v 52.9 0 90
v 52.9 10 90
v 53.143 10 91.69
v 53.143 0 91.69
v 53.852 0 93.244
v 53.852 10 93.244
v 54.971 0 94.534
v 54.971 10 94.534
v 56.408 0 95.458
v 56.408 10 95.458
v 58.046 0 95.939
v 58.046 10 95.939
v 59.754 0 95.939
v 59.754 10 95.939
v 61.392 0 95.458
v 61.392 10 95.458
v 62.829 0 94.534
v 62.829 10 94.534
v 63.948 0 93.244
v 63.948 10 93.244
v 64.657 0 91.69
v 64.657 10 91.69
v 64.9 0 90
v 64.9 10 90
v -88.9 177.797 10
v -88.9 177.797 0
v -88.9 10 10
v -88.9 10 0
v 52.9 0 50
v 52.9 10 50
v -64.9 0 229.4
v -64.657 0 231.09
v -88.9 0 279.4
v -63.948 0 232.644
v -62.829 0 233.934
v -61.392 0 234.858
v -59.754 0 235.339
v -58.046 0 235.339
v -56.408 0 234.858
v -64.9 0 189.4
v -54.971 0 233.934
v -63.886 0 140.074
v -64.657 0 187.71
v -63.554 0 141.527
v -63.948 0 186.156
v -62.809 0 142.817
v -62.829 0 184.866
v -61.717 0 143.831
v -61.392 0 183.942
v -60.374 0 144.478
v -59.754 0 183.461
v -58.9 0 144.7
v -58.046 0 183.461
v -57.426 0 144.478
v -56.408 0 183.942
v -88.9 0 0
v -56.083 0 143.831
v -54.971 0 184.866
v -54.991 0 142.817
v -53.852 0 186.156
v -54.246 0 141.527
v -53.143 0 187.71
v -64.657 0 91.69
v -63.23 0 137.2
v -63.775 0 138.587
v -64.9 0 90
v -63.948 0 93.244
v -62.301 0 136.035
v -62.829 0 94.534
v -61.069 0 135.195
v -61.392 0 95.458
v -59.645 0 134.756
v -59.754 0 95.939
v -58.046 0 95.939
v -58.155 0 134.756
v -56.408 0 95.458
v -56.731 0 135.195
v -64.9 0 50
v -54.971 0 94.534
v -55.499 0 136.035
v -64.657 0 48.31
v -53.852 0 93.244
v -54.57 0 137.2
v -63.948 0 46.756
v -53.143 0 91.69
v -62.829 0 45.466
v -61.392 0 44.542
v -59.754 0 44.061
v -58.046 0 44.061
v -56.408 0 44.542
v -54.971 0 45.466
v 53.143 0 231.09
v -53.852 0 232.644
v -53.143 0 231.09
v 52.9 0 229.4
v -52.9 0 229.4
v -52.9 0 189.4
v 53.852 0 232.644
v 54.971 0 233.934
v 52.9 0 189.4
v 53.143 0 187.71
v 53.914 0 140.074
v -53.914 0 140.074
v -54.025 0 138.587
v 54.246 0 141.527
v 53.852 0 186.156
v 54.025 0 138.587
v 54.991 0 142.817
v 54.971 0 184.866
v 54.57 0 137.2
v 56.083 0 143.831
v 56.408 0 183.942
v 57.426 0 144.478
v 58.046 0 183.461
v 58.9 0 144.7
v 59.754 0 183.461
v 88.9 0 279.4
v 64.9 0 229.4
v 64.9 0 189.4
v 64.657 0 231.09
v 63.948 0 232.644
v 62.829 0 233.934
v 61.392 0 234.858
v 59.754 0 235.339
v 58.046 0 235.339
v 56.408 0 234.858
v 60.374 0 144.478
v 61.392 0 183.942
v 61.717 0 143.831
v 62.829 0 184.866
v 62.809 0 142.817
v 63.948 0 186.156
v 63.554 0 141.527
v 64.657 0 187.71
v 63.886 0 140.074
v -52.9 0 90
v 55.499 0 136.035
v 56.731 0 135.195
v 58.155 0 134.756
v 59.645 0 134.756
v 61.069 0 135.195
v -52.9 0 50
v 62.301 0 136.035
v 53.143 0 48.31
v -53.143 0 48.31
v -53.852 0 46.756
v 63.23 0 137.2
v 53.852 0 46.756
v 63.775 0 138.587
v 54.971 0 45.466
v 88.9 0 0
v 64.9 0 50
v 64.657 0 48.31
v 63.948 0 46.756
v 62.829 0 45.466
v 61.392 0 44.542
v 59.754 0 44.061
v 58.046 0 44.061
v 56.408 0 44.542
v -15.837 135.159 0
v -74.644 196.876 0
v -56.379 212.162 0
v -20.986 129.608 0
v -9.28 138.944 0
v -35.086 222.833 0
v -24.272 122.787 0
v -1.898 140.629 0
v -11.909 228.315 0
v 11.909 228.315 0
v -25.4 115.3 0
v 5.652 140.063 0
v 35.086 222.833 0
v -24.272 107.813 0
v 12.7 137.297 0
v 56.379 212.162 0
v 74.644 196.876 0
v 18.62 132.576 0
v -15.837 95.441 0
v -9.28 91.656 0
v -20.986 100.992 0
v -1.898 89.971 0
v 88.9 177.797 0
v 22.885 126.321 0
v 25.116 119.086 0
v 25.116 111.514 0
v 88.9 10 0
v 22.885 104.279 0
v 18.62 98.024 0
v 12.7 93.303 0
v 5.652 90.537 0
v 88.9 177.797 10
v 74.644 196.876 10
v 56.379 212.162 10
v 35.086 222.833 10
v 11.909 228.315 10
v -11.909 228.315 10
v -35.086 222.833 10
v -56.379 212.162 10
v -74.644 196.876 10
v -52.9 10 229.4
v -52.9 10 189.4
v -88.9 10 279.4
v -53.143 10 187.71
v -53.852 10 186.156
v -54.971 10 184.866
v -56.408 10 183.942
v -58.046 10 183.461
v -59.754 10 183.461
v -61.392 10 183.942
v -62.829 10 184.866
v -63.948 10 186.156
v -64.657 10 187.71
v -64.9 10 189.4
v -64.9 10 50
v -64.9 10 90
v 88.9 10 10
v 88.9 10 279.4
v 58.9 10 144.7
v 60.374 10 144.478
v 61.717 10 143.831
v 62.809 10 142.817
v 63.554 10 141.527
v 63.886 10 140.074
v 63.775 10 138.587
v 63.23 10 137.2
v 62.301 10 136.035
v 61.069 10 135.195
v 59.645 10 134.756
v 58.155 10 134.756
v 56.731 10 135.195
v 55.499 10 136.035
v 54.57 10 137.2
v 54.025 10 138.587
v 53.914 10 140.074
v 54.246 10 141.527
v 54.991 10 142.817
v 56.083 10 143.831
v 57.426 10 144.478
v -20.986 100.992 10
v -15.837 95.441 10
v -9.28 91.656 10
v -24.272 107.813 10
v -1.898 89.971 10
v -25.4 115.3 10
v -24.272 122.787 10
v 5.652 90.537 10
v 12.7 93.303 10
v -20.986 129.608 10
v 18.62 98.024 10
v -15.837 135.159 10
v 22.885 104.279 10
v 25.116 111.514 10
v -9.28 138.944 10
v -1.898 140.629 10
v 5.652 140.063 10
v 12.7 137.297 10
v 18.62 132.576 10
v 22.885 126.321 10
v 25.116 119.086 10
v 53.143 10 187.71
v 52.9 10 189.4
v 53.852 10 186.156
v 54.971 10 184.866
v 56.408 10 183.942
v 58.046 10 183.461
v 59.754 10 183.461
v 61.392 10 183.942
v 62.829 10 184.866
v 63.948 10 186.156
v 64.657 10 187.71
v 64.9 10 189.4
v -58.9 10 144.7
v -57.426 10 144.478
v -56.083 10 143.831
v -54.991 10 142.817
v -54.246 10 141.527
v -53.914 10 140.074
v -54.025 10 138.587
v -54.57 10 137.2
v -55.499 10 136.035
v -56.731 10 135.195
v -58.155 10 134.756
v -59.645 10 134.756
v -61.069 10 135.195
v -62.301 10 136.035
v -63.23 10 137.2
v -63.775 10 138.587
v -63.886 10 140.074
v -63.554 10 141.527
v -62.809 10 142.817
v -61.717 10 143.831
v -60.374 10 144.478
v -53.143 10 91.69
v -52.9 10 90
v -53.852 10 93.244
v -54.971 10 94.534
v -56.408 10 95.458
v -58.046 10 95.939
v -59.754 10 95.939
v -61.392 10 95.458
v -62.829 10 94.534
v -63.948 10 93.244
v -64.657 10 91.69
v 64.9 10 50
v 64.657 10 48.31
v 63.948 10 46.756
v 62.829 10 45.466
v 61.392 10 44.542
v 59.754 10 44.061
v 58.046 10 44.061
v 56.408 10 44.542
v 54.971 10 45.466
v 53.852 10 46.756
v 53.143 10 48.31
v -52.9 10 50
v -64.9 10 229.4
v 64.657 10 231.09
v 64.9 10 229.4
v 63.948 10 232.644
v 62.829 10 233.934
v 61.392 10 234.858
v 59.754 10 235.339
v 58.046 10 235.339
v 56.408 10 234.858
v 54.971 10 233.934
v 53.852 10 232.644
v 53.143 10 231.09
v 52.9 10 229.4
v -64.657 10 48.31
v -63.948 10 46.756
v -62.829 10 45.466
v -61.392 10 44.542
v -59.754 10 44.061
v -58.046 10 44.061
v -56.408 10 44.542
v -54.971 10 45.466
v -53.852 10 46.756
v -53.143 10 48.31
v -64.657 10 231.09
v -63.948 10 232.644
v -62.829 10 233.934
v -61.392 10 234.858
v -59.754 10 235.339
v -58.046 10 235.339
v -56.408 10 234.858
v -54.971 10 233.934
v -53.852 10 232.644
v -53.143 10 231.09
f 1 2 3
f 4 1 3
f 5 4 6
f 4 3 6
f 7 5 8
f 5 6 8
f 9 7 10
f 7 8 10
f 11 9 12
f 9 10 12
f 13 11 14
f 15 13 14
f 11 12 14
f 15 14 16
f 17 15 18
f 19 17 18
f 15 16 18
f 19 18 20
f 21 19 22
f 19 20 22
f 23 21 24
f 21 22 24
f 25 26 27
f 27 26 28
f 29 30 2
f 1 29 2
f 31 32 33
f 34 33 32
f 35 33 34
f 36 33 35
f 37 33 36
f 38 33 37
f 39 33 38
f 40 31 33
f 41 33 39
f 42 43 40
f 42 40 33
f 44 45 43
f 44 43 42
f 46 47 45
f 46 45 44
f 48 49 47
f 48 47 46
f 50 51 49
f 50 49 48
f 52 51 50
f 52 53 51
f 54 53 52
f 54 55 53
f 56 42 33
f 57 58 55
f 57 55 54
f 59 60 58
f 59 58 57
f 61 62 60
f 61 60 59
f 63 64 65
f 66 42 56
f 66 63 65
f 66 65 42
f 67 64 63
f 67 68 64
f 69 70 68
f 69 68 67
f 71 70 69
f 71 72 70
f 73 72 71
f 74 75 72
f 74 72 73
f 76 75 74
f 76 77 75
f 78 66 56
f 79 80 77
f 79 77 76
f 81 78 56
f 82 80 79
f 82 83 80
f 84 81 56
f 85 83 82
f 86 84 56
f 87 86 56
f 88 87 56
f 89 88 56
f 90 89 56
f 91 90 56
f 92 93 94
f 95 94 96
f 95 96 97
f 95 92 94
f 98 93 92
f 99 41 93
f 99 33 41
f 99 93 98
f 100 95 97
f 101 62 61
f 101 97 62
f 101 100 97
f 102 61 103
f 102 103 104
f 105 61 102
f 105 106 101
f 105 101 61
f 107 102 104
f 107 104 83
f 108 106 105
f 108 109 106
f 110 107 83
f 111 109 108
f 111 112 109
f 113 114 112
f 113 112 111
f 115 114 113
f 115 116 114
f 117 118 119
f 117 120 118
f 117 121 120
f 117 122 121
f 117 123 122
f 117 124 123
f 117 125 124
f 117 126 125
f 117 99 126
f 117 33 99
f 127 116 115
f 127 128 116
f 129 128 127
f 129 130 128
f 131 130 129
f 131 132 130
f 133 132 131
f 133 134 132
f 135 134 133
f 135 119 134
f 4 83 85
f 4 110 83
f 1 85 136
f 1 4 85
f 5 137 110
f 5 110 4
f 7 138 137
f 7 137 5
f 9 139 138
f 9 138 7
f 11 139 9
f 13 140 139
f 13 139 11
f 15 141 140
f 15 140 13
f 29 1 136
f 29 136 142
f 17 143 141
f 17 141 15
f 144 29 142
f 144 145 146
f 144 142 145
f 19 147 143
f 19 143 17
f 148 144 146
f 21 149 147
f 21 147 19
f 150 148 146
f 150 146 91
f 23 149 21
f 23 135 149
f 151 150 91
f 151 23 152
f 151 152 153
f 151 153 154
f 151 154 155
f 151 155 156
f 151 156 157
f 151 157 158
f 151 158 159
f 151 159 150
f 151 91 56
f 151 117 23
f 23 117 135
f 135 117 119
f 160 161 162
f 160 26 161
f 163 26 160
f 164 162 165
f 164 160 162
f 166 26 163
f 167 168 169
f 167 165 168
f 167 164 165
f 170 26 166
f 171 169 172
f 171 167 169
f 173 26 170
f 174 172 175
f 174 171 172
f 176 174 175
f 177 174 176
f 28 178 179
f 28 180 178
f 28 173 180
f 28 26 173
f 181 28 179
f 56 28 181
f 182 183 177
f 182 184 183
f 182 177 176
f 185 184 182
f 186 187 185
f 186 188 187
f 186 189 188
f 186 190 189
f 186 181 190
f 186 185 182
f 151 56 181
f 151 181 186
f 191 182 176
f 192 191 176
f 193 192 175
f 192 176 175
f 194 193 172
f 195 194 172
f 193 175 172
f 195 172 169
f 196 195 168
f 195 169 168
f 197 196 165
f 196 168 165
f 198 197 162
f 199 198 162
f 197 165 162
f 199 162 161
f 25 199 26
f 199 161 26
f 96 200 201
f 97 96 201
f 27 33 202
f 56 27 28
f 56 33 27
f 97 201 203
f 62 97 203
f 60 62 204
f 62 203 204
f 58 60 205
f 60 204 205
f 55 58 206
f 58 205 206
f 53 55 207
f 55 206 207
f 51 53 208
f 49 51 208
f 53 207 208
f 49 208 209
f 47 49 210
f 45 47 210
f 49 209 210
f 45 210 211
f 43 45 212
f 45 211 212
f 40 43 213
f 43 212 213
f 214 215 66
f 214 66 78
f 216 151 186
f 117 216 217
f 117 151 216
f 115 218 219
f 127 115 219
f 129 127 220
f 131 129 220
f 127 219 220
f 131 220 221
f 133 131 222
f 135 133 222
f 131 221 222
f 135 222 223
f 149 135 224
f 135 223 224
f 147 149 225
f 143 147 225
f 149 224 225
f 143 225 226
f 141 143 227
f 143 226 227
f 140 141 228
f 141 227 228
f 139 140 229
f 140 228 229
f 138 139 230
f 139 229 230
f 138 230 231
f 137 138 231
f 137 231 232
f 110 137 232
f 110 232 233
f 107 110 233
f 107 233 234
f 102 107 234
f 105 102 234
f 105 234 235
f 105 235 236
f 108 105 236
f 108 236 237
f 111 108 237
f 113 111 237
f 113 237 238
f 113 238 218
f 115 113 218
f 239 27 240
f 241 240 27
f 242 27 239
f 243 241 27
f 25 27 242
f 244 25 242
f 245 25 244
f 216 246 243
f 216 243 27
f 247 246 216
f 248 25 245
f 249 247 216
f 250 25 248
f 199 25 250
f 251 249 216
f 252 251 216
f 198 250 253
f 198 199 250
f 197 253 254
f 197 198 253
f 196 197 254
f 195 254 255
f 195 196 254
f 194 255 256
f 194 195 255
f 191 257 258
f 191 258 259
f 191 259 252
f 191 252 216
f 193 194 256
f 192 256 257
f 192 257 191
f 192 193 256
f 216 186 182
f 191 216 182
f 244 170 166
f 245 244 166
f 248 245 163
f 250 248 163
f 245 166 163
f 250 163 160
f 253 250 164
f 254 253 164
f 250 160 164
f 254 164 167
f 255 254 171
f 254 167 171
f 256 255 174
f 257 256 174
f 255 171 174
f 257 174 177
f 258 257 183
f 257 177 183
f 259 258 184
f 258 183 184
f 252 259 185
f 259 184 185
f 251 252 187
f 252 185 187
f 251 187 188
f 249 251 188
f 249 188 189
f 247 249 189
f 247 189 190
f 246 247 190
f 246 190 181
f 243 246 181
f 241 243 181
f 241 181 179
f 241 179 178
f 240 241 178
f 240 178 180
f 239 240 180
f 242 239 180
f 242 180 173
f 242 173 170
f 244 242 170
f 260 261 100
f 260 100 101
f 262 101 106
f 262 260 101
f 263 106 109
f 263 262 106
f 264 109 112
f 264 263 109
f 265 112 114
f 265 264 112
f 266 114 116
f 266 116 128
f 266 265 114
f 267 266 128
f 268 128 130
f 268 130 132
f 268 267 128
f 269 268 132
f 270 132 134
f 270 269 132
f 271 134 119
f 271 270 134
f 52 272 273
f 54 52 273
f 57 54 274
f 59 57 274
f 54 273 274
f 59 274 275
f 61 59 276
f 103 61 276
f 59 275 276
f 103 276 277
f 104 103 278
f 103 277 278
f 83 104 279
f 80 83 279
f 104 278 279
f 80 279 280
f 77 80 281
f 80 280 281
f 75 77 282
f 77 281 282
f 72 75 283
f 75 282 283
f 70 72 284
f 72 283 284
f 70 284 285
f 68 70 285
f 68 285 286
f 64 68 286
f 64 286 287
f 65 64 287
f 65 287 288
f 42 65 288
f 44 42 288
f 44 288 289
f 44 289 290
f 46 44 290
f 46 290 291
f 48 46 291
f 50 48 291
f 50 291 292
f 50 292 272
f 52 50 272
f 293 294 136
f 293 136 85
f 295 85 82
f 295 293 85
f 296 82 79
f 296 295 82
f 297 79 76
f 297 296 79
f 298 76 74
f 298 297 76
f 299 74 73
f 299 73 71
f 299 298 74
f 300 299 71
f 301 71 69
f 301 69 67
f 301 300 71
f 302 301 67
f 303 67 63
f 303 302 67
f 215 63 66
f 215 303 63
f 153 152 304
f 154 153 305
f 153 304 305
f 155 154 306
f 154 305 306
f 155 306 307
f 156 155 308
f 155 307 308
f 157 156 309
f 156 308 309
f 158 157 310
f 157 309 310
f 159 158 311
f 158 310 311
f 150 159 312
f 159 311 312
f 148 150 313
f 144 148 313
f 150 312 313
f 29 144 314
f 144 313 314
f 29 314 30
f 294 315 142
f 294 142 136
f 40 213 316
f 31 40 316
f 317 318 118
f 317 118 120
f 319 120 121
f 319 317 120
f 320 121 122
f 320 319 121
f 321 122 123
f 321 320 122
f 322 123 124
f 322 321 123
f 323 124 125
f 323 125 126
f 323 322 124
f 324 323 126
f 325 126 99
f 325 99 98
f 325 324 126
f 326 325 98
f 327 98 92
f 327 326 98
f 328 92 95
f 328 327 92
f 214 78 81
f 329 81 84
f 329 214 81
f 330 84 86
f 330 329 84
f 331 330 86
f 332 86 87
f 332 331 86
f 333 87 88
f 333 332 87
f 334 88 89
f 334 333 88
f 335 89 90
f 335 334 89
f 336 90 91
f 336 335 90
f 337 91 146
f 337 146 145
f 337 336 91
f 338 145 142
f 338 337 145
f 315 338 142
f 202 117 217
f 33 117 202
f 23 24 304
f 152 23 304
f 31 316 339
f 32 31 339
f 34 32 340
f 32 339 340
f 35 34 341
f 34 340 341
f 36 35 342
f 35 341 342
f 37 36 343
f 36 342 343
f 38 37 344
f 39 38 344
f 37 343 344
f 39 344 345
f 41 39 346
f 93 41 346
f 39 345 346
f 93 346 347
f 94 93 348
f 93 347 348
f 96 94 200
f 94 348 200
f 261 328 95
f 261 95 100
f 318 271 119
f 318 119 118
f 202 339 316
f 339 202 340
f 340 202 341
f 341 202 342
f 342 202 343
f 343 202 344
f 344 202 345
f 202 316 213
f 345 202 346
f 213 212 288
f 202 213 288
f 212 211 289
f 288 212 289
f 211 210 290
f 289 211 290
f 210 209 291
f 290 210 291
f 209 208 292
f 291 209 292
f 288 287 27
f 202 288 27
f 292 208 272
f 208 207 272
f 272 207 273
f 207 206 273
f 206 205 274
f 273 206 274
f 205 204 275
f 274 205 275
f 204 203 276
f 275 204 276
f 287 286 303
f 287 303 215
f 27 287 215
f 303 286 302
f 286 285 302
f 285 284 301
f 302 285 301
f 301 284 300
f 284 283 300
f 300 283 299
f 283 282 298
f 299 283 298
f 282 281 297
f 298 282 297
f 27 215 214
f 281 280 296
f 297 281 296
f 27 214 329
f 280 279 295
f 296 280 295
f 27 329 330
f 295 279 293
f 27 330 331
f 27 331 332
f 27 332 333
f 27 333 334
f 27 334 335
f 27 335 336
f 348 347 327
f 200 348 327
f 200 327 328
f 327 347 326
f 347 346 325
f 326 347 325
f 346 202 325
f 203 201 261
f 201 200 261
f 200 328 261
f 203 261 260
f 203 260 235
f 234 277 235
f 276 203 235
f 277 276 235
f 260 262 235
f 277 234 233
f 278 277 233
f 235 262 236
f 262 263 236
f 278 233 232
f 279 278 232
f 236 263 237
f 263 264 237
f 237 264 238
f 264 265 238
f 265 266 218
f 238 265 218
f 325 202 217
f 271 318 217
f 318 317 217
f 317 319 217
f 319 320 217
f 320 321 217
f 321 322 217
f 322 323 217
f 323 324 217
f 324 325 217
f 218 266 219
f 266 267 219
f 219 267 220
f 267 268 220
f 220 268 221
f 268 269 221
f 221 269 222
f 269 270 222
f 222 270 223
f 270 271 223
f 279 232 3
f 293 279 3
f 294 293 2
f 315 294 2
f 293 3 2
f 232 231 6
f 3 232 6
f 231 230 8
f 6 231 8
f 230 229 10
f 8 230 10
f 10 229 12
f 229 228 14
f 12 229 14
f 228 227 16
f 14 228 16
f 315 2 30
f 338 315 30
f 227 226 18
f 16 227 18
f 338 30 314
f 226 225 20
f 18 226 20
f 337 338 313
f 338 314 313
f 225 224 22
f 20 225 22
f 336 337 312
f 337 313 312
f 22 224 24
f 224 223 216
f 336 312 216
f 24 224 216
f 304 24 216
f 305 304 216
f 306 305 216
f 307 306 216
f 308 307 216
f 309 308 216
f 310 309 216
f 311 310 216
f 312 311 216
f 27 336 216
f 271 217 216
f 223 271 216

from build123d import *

# Parameters (mm, degrees)
BOSS_EXTRUDE2_DEPTH = 10
BOSS_EXTRUDE3_DEPTH = 10
SKETCH2_R           = 25.4
CUT_EXTRUDE2_DEPTH  = 373.037550256
CUT_EXTRUDE5_DEPTH  = 10
SKETCH4_R           = 5
CUT_EXTRUDE6_DEPTH  = 366.966927049


with BuildPart() as part:
    # 3DSketch1 → Boss-Extrude2 (new body)
    with BuildSketch(Plane(origin=(88.9, 0, 0), x_dir=(-0.5368754921931593, 0, 0.8436614877321076), z_dir=(0, 1, 0))):
        Polygon((0, 0), (235.719019672, 150.003012519), (331.175482184, 0), (95.456462512, -150.003012519), align=None)
    extrude(amount=BOSS_EXTRUDE2_DEPTH)

    # Sketch1 → Boss-Extrude3 (add)
    with BuildSketch(Plane.XY):
        with BuildLine():
            Line((-88.9, 0), (88.9, 0))
            Line((88.9, 0), (88.9, 177.796999188))
            ThreePointArc((88.9, 177.796999188), (0, 229.007355341), (-88.9, 177.796999188))
            Line((-88.9, 177.796999188), (-88.9, 0))
        make_face()
    extrude(amount=BOSS_EXTRUDE3_DEPTH)

    # Sketch2 → Cut-Extrude2 (cut, through all)
    with BuildSketch(Plane(origin=(0, 0, 0), x_dir=(-1, 0, 0), z_dir=(0, 0, -1))):
        with Locations((0, 115.3)):
            Circle(SKETCH2_R)
    extrude(amount=-CUT_EXTRUDE2_DEPTH, mode=Mode.SUBTRACT)

    # Sketch3 → Cut-Extrude5 (cut)
    with BuildSketch(Plane(origin=(0, 10, 0), x_dir=(1, 0, 0), z_dir=(0, 1, 0))):
        with BuildLine():
            Line((-64.9, -90), (-64.9, -50))
            ThreePointArc((-64.9, -50), (-58.9, -44), (-52.9, -50))
            Line((-52.9, -50), (-52.9, -90))
            ThreePointArc((-52.9, -90), (-58.9, -96), (-64.9, -90))
        make_face()
        with BuildLine():
            Line((64.9, -90), (64.9, -50))
            ThreePointArc((64.9, -50), (58.9, -44), (52.9, -50))
            Line((52.9, -50), (52.9, -90))
            ThreePointArc((52.9, -90), (58.9, -96), (64.9, -90))
        make_face()
        with BuildLine():
            Line((64.9, -189.4), (64.9, -229.4))
            ThreePointArc((64.9, -229.4), (58.9, -235.4), (52.9, -229.4))
            Line((52.9, -229.4), (52.9, -189.4))
            ThreePointArc((52.9, -189.4), (58.9, -183.4), (64.9, -189.4))
        make_face()
        with BuildLine():
            Line((-64.9, -189.4), (-64.9, -229.4))
            ThreePointArc((-64.9, -229.4), (-58.9, -235.4), (-52.9, -229.4))
            Line((-52.9, -229.4), (-52.9, -189.4))
            ThreePointArc((-52.9, -189.4), (-58.9, -183.4), (-64.9, -189.4))
        make_face()
    extrude(amount=-CUT_EXTRUDE5_DEPTH, mode=Mode.SUBTRACT)

    # Sketch4 → Cut-Extrude6 (cut, through all)
    with BuildSketch(Plane(origin=(0, 10, 0), x_dir=(1, 0, 0), z_dir=(0, 1, 0))):
        with Locations(Location((-58.9, -139.7, 0), (0, 0, 270))):
            Circle(SKETCH4_R)
        with Locations(Location((58.9, -139.7, 0), (0, 0, 270))):
            Circle(SKETCH4_R)
    extrude(amount=-CUT_EXTRUDE6_DEPTH, mode=Mode.SUBTRACT)


solid = part.part
